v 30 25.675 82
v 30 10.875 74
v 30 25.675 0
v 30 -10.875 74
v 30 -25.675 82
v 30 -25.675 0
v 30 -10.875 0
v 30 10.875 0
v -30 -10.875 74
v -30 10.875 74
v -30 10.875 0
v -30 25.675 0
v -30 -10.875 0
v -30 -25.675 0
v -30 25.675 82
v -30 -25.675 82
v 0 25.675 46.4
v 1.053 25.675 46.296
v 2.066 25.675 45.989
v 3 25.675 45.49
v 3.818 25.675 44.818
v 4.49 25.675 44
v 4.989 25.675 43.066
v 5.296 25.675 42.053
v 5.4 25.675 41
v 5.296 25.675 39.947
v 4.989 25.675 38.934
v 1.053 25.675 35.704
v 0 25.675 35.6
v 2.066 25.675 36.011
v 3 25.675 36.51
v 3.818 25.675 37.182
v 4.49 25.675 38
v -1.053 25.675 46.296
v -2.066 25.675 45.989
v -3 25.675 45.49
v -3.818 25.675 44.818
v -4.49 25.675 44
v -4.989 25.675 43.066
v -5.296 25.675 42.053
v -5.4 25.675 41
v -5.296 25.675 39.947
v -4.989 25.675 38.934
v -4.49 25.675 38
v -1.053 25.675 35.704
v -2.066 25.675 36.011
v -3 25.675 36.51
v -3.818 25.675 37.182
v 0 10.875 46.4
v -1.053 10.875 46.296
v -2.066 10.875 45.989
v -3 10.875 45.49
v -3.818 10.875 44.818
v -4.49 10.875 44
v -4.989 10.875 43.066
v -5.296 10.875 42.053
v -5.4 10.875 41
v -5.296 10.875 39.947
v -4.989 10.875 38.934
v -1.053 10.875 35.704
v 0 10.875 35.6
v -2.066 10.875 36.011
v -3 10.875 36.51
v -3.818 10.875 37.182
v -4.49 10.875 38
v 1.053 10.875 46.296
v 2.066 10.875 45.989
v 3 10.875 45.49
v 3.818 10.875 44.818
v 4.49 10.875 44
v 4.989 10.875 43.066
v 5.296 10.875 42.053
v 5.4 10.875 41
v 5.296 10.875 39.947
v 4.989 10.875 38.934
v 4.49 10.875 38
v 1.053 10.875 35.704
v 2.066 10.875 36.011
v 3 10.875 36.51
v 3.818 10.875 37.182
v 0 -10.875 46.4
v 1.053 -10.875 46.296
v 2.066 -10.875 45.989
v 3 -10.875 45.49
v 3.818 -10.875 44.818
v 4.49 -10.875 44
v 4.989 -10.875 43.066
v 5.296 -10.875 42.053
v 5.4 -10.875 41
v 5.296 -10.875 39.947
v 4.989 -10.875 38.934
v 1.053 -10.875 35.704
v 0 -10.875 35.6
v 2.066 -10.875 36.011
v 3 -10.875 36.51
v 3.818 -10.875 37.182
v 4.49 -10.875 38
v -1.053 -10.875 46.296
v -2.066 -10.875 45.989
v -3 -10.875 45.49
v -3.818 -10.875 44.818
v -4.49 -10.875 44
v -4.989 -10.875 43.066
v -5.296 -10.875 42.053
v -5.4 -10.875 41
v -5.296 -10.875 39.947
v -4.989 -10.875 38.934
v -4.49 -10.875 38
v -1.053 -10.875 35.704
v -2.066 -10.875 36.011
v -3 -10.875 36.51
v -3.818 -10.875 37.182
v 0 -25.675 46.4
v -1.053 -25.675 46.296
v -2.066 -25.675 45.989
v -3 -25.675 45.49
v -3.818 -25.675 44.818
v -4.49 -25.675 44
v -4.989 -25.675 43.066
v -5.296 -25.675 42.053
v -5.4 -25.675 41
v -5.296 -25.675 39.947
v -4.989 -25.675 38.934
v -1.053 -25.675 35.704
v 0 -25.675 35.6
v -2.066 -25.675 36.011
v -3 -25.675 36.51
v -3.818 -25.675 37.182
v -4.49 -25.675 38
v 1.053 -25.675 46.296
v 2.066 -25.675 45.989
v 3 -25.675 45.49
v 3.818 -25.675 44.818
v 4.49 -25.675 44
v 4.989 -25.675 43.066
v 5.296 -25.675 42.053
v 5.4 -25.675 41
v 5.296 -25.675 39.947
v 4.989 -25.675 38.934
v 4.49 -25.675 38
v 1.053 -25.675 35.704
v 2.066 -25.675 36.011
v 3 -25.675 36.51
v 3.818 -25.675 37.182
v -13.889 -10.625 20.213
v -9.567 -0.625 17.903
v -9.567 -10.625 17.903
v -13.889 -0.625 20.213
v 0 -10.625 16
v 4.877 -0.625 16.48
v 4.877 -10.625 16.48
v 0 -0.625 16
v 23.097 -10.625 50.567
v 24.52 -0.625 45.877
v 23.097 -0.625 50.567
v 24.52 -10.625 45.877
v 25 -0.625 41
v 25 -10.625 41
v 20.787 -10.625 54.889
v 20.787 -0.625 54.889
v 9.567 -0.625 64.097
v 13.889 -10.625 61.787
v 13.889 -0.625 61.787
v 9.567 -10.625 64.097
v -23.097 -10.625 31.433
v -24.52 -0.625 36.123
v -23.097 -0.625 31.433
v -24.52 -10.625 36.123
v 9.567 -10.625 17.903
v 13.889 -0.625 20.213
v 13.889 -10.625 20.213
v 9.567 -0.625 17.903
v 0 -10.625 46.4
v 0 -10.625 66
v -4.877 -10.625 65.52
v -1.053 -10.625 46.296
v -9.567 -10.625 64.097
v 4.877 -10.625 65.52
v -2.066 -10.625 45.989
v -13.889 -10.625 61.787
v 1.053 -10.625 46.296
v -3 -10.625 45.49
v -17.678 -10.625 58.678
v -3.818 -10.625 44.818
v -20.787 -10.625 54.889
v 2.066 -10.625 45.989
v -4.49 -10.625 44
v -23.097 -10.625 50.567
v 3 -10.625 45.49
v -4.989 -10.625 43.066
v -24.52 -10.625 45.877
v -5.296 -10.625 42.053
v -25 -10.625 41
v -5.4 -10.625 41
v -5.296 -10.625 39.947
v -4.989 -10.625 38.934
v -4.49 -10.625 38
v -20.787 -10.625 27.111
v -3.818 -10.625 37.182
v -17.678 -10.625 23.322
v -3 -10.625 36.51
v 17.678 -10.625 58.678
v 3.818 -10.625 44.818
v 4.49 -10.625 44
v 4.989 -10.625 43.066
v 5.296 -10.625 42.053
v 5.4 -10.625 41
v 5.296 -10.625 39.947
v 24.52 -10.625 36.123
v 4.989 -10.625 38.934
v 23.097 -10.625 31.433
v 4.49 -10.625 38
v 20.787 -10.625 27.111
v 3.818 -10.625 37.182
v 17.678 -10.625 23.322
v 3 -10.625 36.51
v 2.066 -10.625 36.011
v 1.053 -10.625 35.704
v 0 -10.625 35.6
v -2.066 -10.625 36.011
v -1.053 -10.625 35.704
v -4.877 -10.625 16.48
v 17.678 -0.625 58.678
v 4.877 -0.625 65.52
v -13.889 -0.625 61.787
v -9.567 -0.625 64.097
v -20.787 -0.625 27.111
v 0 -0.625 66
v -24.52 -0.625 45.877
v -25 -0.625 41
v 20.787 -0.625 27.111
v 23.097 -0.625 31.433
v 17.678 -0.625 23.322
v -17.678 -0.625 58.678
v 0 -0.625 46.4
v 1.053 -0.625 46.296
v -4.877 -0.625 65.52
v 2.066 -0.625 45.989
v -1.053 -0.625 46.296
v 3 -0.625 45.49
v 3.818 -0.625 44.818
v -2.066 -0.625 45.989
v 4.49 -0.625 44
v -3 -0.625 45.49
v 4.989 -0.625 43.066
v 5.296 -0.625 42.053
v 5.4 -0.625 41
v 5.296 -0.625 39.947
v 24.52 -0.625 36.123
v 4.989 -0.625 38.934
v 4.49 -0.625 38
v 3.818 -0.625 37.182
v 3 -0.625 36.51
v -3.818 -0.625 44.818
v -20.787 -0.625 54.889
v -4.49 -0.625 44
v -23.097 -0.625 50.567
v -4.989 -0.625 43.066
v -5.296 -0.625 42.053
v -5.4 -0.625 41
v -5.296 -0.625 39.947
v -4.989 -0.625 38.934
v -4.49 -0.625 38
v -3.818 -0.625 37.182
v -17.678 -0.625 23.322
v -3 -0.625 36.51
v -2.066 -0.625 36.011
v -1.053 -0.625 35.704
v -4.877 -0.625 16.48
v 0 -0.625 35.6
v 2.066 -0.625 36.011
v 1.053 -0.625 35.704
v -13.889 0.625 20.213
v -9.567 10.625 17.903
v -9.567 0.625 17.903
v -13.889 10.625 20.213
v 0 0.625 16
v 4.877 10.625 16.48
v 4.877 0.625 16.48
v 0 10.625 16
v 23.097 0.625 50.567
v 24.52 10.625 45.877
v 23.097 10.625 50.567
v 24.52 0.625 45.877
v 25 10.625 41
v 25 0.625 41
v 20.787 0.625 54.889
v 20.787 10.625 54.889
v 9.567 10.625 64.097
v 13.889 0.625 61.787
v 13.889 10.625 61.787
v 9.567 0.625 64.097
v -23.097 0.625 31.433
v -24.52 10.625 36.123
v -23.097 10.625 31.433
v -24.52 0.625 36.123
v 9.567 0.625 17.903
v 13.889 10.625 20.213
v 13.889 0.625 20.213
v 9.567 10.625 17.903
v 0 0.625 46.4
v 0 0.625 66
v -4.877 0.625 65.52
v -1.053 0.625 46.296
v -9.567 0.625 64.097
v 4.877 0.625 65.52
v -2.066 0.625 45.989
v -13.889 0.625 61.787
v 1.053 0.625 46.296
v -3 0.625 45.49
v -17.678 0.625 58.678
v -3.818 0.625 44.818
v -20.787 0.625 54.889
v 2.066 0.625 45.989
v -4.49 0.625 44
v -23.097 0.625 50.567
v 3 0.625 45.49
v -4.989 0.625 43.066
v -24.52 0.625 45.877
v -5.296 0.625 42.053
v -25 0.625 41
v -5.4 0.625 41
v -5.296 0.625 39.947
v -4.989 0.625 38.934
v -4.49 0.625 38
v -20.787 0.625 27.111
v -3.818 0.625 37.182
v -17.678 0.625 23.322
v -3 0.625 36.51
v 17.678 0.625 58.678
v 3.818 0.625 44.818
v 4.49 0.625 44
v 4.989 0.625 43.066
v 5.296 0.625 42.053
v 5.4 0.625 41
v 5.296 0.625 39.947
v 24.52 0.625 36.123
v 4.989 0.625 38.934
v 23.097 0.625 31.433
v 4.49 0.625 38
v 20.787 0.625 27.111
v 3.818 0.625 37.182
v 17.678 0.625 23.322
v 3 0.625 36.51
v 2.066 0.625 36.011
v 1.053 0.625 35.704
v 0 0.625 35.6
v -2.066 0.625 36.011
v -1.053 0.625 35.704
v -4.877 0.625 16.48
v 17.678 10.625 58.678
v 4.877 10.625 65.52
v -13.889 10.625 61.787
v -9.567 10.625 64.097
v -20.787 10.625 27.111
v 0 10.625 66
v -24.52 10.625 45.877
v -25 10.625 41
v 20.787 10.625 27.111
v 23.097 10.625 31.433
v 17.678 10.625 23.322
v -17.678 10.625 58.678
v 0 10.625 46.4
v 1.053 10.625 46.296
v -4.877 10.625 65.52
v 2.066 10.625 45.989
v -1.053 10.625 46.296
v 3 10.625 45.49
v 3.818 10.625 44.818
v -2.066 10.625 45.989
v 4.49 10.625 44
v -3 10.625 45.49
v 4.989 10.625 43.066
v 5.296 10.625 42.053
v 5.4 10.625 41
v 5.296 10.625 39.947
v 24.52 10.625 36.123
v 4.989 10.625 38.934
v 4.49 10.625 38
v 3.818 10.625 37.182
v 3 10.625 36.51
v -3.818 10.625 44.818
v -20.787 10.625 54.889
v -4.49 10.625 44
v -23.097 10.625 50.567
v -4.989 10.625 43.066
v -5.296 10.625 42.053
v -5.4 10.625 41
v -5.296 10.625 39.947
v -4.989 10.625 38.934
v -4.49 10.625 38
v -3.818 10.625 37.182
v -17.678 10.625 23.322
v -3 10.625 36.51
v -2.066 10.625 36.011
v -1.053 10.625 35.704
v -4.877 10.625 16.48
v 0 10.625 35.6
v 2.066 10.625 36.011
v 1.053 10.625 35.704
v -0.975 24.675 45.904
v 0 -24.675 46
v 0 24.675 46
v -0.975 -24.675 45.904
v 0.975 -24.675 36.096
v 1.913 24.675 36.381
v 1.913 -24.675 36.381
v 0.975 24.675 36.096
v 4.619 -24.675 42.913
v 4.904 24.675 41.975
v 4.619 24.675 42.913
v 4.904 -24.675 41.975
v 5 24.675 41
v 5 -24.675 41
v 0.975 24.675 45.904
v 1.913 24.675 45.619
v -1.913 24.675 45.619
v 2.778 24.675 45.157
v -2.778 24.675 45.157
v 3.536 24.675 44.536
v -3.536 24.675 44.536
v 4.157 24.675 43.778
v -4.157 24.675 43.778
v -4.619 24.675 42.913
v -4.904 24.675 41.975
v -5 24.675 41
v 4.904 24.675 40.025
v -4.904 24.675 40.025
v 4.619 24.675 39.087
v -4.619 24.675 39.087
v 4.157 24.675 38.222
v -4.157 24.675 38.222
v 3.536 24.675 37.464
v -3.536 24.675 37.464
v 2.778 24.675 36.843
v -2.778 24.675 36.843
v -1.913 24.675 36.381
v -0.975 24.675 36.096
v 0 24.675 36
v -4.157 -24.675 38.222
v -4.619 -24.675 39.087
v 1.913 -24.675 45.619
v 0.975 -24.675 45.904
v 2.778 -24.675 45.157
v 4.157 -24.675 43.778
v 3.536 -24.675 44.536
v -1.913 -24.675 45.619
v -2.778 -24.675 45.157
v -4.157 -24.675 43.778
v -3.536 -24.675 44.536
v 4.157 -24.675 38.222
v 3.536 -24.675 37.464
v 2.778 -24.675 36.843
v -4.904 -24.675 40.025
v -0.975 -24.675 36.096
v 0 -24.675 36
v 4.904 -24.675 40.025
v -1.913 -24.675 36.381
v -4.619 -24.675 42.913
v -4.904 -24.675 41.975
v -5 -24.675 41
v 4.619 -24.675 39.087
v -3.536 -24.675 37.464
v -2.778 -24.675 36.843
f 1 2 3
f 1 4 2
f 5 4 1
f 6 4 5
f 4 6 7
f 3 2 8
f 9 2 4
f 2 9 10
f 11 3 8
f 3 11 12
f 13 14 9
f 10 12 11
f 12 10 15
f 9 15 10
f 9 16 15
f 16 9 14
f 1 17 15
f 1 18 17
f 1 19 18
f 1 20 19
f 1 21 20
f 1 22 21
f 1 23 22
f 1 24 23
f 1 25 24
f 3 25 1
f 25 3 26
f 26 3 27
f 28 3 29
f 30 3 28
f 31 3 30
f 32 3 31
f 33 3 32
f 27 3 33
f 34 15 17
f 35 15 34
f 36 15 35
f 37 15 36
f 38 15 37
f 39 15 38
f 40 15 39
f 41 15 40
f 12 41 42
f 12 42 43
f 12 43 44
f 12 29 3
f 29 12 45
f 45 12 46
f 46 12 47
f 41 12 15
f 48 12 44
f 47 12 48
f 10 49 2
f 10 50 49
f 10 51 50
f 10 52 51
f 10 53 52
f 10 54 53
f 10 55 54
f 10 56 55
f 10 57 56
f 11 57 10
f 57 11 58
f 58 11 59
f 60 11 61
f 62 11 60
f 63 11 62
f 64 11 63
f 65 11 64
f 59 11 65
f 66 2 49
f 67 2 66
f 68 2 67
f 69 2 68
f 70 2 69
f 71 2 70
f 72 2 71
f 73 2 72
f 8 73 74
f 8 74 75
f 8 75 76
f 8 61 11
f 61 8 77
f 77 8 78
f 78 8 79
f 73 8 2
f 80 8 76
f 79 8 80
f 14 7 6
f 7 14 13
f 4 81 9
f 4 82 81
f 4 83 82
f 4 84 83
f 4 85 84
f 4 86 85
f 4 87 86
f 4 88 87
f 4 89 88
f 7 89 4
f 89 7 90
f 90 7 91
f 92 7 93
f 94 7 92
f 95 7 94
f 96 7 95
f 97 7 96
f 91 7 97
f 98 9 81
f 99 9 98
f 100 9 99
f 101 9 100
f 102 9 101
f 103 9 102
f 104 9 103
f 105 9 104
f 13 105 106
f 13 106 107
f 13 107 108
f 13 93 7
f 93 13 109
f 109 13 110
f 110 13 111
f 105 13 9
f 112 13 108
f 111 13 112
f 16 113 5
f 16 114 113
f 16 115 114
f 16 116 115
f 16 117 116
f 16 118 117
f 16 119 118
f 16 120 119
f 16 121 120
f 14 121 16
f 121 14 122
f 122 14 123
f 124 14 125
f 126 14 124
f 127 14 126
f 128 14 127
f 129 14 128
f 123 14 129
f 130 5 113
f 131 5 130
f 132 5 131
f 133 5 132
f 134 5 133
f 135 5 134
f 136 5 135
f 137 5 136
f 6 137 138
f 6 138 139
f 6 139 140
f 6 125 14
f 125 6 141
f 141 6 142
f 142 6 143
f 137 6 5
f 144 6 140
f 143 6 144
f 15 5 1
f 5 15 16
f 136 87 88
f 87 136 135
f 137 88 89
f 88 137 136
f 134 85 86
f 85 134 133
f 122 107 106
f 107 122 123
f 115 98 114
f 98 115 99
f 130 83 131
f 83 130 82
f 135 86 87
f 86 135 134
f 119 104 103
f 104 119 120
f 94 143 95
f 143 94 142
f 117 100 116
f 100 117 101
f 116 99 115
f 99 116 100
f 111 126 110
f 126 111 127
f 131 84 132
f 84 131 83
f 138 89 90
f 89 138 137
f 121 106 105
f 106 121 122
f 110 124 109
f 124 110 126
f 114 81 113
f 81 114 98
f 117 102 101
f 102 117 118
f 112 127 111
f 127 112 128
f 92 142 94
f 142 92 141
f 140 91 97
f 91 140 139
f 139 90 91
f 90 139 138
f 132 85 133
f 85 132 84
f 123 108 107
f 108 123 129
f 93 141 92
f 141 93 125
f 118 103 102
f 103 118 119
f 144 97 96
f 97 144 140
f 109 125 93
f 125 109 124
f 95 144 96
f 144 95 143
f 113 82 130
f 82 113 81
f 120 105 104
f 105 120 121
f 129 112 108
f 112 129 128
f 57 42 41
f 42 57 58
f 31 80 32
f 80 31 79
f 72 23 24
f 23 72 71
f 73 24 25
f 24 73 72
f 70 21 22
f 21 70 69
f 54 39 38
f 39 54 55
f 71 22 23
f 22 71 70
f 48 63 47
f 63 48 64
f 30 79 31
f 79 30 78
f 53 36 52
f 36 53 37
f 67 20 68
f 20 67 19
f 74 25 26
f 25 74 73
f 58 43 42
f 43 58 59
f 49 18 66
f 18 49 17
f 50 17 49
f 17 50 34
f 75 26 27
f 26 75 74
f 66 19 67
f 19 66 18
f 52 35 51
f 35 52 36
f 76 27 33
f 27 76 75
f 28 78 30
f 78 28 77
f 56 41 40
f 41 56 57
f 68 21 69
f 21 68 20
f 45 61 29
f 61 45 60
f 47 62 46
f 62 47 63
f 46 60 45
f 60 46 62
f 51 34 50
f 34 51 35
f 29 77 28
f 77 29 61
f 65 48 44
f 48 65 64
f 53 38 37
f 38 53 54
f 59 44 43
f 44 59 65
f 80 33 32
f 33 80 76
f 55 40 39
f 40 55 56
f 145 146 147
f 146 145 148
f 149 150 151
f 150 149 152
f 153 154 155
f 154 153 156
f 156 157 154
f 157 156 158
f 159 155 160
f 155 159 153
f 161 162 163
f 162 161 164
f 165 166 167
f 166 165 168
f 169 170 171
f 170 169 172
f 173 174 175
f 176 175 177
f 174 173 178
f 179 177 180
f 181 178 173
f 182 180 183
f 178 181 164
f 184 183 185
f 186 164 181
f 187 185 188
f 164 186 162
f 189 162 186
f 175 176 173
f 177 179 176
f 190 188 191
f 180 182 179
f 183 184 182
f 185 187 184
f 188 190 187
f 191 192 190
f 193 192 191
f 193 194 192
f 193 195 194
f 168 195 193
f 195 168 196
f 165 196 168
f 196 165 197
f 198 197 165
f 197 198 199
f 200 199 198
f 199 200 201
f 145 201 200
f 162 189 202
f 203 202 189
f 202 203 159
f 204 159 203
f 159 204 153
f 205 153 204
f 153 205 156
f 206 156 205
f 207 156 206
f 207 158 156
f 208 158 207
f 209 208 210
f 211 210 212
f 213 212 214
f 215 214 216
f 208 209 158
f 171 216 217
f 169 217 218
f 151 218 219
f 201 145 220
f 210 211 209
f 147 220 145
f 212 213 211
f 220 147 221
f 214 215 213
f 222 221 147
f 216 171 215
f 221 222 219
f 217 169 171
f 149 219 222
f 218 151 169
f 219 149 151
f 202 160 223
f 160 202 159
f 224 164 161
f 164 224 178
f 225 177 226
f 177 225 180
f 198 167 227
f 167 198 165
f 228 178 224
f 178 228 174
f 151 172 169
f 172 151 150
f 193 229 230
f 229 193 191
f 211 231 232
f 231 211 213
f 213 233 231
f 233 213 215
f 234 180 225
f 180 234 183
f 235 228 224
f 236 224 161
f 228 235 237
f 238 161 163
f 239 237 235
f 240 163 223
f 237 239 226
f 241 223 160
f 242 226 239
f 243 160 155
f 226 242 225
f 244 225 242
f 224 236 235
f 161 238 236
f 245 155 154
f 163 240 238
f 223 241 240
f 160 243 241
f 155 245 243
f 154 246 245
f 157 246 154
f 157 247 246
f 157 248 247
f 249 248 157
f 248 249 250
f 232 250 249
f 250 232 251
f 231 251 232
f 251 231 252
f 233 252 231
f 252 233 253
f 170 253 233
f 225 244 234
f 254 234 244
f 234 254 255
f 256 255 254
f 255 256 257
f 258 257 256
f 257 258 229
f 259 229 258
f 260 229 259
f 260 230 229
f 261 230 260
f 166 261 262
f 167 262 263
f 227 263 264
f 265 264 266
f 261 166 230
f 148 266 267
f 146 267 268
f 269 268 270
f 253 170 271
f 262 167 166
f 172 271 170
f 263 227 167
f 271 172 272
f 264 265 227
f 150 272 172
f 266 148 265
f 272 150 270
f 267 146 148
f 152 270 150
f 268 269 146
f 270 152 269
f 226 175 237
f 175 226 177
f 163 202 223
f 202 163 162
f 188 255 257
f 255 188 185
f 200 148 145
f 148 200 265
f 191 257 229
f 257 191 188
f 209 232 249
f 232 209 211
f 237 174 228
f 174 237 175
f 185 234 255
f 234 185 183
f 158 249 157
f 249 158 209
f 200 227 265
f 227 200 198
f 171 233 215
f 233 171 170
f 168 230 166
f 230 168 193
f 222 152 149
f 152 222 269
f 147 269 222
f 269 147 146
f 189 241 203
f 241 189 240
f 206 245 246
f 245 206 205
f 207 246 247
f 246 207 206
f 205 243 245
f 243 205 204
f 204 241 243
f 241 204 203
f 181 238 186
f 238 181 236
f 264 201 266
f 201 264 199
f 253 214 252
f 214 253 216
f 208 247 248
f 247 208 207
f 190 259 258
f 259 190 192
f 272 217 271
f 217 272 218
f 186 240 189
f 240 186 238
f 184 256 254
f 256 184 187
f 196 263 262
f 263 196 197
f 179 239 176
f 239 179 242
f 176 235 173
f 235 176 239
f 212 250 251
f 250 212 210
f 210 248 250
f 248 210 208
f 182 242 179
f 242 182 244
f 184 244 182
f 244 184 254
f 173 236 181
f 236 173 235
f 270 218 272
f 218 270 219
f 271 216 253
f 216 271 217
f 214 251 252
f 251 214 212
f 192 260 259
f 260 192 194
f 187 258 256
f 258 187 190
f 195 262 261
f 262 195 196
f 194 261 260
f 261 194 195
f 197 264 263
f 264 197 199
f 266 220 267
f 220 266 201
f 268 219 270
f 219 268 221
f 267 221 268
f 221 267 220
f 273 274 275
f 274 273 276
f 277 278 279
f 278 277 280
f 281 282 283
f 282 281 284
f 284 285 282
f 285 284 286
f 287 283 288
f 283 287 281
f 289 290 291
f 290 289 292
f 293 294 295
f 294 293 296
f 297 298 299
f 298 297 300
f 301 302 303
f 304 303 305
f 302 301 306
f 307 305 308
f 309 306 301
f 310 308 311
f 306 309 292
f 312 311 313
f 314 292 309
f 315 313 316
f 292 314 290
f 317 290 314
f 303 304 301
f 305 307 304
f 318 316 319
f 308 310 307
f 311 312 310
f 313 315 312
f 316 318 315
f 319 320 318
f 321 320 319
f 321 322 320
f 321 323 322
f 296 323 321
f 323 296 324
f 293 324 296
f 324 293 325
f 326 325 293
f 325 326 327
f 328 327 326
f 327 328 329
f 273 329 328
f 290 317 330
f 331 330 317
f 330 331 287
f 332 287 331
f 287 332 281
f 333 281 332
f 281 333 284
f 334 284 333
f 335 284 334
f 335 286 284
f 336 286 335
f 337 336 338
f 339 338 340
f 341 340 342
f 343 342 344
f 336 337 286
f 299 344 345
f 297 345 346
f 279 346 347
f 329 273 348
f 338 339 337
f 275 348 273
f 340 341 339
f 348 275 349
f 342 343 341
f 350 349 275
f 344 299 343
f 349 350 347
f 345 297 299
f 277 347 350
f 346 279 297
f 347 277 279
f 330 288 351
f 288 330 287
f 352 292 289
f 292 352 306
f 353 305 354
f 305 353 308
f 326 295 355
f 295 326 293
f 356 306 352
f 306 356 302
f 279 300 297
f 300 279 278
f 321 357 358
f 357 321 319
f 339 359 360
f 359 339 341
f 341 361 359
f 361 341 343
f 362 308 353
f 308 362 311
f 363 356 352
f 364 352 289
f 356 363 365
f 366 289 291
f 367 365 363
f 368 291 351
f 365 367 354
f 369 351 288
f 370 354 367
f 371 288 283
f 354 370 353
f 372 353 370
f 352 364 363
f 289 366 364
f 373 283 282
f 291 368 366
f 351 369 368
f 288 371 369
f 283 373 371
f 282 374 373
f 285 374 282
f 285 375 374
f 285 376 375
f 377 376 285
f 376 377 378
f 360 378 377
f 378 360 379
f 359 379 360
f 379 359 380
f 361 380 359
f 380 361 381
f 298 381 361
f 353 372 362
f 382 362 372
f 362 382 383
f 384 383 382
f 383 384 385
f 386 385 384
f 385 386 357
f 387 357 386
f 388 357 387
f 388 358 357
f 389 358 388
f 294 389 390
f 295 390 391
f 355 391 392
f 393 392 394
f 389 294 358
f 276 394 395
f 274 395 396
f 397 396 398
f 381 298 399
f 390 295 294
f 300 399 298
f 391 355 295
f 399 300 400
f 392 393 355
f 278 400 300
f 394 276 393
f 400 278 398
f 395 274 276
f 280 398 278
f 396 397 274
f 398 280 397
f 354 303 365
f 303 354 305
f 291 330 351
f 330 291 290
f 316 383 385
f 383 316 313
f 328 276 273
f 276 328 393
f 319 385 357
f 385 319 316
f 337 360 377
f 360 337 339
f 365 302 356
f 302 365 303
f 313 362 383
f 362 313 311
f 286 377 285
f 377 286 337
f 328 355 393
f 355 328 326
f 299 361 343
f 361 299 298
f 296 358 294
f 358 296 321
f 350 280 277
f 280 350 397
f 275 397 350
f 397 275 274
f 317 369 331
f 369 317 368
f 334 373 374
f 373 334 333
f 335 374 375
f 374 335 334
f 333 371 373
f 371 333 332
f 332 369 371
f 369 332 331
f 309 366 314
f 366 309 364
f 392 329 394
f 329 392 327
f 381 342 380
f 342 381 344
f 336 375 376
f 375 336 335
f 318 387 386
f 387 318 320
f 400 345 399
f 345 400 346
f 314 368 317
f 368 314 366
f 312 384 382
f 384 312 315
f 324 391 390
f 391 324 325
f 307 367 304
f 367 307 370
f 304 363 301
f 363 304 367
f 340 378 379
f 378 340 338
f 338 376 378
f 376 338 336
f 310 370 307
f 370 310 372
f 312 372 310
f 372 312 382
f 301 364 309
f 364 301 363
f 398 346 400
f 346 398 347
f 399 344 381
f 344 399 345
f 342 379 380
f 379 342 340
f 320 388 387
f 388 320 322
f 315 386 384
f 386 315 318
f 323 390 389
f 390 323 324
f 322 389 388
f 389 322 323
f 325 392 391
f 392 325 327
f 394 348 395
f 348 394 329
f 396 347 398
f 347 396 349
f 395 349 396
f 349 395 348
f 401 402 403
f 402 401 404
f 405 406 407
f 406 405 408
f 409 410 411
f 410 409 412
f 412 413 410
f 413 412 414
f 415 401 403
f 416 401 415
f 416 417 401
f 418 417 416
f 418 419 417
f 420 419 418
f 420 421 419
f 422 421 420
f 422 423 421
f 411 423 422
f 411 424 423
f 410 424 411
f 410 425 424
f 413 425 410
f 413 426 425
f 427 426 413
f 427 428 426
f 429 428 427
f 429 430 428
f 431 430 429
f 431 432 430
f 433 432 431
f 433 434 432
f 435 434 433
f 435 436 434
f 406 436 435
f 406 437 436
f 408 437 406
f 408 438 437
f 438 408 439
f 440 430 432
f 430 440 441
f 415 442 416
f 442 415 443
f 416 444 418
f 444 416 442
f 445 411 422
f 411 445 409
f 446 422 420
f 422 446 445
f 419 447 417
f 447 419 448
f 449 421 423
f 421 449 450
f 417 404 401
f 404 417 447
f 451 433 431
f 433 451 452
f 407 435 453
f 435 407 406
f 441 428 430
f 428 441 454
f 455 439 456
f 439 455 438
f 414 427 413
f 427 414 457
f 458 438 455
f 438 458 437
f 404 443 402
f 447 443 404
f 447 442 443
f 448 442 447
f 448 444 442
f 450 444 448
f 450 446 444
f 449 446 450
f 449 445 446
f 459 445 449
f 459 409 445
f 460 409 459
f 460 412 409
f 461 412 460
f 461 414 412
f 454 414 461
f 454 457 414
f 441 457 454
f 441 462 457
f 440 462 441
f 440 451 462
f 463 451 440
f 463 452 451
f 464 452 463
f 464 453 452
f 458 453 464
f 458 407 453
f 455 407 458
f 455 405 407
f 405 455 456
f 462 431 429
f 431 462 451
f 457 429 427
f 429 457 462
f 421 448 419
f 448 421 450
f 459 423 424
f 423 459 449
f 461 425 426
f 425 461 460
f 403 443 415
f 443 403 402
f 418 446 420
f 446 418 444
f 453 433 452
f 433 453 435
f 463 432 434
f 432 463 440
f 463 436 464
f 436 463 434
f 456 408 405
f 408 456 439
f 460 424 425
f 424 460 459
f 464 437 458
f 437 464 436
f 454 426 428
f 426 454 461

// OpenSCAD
$fn = 32;

// ------------------------------------------------------------------------
// Trolley wheel set: wheels d50, fork 74 mm tall
// Every part is its own module, assembly() places every instance.
// ------------------------------------------------------------------------

// --- part 1 ---
module trolley_fork() {
  difference() {
    union() {
      translate([-30, 10.875, 0]) cube([60, 14.8, 74]);
      translate([-30, -25.675, 0]) cube([60, 14.8, 74]);
      translate([-30, -25.675, 74]) cube([60, 51.35, 8]);
    }
    translate([0, -18.275, 41]) rotate([90, 0, 0]) cylinder(h = 16.8, d = 10.8, center = true);
    translate([0, 18.275, 41]) rotate([90, 0, 0]) cylinder(h = 16.8, d = 10.8, center = true);
  }
}

// --- part 2 ---
module trolley_wheel() {
  difference() {
      translate([0, 0, 0]) cylinder(h = 10, d = 50);
      translate([0, 0, -1]) cylinder(h = 12, d = 10.8);
    }
}

// --- part 3 ---
module trolley_axle() {
  translate([0, 0, -24.675]) cylinder(h = 49.35, d = 10);
}

// --- assembly ---
module assembly() {
  color([0.80, 0.24, 0.20]) translate([0, 0, 0]) rotate([0, 0, 0]) trolley_fork();
  color([0.20, 0.45, 0.75]) translate([0, -0.625, 41]) rotate([90, 0, 0]) trolley_wheel();
  color([0.25, 0.62, 0.32]) translate([0, 10.625, 41]) rotate([90, 0, 0]) trolley_wheel();
  color([0.92, 0.70, 0.18]) translate([0, 0, 41]) rotate([90, 0, 0]) trolley_axle();
}

assembly();
